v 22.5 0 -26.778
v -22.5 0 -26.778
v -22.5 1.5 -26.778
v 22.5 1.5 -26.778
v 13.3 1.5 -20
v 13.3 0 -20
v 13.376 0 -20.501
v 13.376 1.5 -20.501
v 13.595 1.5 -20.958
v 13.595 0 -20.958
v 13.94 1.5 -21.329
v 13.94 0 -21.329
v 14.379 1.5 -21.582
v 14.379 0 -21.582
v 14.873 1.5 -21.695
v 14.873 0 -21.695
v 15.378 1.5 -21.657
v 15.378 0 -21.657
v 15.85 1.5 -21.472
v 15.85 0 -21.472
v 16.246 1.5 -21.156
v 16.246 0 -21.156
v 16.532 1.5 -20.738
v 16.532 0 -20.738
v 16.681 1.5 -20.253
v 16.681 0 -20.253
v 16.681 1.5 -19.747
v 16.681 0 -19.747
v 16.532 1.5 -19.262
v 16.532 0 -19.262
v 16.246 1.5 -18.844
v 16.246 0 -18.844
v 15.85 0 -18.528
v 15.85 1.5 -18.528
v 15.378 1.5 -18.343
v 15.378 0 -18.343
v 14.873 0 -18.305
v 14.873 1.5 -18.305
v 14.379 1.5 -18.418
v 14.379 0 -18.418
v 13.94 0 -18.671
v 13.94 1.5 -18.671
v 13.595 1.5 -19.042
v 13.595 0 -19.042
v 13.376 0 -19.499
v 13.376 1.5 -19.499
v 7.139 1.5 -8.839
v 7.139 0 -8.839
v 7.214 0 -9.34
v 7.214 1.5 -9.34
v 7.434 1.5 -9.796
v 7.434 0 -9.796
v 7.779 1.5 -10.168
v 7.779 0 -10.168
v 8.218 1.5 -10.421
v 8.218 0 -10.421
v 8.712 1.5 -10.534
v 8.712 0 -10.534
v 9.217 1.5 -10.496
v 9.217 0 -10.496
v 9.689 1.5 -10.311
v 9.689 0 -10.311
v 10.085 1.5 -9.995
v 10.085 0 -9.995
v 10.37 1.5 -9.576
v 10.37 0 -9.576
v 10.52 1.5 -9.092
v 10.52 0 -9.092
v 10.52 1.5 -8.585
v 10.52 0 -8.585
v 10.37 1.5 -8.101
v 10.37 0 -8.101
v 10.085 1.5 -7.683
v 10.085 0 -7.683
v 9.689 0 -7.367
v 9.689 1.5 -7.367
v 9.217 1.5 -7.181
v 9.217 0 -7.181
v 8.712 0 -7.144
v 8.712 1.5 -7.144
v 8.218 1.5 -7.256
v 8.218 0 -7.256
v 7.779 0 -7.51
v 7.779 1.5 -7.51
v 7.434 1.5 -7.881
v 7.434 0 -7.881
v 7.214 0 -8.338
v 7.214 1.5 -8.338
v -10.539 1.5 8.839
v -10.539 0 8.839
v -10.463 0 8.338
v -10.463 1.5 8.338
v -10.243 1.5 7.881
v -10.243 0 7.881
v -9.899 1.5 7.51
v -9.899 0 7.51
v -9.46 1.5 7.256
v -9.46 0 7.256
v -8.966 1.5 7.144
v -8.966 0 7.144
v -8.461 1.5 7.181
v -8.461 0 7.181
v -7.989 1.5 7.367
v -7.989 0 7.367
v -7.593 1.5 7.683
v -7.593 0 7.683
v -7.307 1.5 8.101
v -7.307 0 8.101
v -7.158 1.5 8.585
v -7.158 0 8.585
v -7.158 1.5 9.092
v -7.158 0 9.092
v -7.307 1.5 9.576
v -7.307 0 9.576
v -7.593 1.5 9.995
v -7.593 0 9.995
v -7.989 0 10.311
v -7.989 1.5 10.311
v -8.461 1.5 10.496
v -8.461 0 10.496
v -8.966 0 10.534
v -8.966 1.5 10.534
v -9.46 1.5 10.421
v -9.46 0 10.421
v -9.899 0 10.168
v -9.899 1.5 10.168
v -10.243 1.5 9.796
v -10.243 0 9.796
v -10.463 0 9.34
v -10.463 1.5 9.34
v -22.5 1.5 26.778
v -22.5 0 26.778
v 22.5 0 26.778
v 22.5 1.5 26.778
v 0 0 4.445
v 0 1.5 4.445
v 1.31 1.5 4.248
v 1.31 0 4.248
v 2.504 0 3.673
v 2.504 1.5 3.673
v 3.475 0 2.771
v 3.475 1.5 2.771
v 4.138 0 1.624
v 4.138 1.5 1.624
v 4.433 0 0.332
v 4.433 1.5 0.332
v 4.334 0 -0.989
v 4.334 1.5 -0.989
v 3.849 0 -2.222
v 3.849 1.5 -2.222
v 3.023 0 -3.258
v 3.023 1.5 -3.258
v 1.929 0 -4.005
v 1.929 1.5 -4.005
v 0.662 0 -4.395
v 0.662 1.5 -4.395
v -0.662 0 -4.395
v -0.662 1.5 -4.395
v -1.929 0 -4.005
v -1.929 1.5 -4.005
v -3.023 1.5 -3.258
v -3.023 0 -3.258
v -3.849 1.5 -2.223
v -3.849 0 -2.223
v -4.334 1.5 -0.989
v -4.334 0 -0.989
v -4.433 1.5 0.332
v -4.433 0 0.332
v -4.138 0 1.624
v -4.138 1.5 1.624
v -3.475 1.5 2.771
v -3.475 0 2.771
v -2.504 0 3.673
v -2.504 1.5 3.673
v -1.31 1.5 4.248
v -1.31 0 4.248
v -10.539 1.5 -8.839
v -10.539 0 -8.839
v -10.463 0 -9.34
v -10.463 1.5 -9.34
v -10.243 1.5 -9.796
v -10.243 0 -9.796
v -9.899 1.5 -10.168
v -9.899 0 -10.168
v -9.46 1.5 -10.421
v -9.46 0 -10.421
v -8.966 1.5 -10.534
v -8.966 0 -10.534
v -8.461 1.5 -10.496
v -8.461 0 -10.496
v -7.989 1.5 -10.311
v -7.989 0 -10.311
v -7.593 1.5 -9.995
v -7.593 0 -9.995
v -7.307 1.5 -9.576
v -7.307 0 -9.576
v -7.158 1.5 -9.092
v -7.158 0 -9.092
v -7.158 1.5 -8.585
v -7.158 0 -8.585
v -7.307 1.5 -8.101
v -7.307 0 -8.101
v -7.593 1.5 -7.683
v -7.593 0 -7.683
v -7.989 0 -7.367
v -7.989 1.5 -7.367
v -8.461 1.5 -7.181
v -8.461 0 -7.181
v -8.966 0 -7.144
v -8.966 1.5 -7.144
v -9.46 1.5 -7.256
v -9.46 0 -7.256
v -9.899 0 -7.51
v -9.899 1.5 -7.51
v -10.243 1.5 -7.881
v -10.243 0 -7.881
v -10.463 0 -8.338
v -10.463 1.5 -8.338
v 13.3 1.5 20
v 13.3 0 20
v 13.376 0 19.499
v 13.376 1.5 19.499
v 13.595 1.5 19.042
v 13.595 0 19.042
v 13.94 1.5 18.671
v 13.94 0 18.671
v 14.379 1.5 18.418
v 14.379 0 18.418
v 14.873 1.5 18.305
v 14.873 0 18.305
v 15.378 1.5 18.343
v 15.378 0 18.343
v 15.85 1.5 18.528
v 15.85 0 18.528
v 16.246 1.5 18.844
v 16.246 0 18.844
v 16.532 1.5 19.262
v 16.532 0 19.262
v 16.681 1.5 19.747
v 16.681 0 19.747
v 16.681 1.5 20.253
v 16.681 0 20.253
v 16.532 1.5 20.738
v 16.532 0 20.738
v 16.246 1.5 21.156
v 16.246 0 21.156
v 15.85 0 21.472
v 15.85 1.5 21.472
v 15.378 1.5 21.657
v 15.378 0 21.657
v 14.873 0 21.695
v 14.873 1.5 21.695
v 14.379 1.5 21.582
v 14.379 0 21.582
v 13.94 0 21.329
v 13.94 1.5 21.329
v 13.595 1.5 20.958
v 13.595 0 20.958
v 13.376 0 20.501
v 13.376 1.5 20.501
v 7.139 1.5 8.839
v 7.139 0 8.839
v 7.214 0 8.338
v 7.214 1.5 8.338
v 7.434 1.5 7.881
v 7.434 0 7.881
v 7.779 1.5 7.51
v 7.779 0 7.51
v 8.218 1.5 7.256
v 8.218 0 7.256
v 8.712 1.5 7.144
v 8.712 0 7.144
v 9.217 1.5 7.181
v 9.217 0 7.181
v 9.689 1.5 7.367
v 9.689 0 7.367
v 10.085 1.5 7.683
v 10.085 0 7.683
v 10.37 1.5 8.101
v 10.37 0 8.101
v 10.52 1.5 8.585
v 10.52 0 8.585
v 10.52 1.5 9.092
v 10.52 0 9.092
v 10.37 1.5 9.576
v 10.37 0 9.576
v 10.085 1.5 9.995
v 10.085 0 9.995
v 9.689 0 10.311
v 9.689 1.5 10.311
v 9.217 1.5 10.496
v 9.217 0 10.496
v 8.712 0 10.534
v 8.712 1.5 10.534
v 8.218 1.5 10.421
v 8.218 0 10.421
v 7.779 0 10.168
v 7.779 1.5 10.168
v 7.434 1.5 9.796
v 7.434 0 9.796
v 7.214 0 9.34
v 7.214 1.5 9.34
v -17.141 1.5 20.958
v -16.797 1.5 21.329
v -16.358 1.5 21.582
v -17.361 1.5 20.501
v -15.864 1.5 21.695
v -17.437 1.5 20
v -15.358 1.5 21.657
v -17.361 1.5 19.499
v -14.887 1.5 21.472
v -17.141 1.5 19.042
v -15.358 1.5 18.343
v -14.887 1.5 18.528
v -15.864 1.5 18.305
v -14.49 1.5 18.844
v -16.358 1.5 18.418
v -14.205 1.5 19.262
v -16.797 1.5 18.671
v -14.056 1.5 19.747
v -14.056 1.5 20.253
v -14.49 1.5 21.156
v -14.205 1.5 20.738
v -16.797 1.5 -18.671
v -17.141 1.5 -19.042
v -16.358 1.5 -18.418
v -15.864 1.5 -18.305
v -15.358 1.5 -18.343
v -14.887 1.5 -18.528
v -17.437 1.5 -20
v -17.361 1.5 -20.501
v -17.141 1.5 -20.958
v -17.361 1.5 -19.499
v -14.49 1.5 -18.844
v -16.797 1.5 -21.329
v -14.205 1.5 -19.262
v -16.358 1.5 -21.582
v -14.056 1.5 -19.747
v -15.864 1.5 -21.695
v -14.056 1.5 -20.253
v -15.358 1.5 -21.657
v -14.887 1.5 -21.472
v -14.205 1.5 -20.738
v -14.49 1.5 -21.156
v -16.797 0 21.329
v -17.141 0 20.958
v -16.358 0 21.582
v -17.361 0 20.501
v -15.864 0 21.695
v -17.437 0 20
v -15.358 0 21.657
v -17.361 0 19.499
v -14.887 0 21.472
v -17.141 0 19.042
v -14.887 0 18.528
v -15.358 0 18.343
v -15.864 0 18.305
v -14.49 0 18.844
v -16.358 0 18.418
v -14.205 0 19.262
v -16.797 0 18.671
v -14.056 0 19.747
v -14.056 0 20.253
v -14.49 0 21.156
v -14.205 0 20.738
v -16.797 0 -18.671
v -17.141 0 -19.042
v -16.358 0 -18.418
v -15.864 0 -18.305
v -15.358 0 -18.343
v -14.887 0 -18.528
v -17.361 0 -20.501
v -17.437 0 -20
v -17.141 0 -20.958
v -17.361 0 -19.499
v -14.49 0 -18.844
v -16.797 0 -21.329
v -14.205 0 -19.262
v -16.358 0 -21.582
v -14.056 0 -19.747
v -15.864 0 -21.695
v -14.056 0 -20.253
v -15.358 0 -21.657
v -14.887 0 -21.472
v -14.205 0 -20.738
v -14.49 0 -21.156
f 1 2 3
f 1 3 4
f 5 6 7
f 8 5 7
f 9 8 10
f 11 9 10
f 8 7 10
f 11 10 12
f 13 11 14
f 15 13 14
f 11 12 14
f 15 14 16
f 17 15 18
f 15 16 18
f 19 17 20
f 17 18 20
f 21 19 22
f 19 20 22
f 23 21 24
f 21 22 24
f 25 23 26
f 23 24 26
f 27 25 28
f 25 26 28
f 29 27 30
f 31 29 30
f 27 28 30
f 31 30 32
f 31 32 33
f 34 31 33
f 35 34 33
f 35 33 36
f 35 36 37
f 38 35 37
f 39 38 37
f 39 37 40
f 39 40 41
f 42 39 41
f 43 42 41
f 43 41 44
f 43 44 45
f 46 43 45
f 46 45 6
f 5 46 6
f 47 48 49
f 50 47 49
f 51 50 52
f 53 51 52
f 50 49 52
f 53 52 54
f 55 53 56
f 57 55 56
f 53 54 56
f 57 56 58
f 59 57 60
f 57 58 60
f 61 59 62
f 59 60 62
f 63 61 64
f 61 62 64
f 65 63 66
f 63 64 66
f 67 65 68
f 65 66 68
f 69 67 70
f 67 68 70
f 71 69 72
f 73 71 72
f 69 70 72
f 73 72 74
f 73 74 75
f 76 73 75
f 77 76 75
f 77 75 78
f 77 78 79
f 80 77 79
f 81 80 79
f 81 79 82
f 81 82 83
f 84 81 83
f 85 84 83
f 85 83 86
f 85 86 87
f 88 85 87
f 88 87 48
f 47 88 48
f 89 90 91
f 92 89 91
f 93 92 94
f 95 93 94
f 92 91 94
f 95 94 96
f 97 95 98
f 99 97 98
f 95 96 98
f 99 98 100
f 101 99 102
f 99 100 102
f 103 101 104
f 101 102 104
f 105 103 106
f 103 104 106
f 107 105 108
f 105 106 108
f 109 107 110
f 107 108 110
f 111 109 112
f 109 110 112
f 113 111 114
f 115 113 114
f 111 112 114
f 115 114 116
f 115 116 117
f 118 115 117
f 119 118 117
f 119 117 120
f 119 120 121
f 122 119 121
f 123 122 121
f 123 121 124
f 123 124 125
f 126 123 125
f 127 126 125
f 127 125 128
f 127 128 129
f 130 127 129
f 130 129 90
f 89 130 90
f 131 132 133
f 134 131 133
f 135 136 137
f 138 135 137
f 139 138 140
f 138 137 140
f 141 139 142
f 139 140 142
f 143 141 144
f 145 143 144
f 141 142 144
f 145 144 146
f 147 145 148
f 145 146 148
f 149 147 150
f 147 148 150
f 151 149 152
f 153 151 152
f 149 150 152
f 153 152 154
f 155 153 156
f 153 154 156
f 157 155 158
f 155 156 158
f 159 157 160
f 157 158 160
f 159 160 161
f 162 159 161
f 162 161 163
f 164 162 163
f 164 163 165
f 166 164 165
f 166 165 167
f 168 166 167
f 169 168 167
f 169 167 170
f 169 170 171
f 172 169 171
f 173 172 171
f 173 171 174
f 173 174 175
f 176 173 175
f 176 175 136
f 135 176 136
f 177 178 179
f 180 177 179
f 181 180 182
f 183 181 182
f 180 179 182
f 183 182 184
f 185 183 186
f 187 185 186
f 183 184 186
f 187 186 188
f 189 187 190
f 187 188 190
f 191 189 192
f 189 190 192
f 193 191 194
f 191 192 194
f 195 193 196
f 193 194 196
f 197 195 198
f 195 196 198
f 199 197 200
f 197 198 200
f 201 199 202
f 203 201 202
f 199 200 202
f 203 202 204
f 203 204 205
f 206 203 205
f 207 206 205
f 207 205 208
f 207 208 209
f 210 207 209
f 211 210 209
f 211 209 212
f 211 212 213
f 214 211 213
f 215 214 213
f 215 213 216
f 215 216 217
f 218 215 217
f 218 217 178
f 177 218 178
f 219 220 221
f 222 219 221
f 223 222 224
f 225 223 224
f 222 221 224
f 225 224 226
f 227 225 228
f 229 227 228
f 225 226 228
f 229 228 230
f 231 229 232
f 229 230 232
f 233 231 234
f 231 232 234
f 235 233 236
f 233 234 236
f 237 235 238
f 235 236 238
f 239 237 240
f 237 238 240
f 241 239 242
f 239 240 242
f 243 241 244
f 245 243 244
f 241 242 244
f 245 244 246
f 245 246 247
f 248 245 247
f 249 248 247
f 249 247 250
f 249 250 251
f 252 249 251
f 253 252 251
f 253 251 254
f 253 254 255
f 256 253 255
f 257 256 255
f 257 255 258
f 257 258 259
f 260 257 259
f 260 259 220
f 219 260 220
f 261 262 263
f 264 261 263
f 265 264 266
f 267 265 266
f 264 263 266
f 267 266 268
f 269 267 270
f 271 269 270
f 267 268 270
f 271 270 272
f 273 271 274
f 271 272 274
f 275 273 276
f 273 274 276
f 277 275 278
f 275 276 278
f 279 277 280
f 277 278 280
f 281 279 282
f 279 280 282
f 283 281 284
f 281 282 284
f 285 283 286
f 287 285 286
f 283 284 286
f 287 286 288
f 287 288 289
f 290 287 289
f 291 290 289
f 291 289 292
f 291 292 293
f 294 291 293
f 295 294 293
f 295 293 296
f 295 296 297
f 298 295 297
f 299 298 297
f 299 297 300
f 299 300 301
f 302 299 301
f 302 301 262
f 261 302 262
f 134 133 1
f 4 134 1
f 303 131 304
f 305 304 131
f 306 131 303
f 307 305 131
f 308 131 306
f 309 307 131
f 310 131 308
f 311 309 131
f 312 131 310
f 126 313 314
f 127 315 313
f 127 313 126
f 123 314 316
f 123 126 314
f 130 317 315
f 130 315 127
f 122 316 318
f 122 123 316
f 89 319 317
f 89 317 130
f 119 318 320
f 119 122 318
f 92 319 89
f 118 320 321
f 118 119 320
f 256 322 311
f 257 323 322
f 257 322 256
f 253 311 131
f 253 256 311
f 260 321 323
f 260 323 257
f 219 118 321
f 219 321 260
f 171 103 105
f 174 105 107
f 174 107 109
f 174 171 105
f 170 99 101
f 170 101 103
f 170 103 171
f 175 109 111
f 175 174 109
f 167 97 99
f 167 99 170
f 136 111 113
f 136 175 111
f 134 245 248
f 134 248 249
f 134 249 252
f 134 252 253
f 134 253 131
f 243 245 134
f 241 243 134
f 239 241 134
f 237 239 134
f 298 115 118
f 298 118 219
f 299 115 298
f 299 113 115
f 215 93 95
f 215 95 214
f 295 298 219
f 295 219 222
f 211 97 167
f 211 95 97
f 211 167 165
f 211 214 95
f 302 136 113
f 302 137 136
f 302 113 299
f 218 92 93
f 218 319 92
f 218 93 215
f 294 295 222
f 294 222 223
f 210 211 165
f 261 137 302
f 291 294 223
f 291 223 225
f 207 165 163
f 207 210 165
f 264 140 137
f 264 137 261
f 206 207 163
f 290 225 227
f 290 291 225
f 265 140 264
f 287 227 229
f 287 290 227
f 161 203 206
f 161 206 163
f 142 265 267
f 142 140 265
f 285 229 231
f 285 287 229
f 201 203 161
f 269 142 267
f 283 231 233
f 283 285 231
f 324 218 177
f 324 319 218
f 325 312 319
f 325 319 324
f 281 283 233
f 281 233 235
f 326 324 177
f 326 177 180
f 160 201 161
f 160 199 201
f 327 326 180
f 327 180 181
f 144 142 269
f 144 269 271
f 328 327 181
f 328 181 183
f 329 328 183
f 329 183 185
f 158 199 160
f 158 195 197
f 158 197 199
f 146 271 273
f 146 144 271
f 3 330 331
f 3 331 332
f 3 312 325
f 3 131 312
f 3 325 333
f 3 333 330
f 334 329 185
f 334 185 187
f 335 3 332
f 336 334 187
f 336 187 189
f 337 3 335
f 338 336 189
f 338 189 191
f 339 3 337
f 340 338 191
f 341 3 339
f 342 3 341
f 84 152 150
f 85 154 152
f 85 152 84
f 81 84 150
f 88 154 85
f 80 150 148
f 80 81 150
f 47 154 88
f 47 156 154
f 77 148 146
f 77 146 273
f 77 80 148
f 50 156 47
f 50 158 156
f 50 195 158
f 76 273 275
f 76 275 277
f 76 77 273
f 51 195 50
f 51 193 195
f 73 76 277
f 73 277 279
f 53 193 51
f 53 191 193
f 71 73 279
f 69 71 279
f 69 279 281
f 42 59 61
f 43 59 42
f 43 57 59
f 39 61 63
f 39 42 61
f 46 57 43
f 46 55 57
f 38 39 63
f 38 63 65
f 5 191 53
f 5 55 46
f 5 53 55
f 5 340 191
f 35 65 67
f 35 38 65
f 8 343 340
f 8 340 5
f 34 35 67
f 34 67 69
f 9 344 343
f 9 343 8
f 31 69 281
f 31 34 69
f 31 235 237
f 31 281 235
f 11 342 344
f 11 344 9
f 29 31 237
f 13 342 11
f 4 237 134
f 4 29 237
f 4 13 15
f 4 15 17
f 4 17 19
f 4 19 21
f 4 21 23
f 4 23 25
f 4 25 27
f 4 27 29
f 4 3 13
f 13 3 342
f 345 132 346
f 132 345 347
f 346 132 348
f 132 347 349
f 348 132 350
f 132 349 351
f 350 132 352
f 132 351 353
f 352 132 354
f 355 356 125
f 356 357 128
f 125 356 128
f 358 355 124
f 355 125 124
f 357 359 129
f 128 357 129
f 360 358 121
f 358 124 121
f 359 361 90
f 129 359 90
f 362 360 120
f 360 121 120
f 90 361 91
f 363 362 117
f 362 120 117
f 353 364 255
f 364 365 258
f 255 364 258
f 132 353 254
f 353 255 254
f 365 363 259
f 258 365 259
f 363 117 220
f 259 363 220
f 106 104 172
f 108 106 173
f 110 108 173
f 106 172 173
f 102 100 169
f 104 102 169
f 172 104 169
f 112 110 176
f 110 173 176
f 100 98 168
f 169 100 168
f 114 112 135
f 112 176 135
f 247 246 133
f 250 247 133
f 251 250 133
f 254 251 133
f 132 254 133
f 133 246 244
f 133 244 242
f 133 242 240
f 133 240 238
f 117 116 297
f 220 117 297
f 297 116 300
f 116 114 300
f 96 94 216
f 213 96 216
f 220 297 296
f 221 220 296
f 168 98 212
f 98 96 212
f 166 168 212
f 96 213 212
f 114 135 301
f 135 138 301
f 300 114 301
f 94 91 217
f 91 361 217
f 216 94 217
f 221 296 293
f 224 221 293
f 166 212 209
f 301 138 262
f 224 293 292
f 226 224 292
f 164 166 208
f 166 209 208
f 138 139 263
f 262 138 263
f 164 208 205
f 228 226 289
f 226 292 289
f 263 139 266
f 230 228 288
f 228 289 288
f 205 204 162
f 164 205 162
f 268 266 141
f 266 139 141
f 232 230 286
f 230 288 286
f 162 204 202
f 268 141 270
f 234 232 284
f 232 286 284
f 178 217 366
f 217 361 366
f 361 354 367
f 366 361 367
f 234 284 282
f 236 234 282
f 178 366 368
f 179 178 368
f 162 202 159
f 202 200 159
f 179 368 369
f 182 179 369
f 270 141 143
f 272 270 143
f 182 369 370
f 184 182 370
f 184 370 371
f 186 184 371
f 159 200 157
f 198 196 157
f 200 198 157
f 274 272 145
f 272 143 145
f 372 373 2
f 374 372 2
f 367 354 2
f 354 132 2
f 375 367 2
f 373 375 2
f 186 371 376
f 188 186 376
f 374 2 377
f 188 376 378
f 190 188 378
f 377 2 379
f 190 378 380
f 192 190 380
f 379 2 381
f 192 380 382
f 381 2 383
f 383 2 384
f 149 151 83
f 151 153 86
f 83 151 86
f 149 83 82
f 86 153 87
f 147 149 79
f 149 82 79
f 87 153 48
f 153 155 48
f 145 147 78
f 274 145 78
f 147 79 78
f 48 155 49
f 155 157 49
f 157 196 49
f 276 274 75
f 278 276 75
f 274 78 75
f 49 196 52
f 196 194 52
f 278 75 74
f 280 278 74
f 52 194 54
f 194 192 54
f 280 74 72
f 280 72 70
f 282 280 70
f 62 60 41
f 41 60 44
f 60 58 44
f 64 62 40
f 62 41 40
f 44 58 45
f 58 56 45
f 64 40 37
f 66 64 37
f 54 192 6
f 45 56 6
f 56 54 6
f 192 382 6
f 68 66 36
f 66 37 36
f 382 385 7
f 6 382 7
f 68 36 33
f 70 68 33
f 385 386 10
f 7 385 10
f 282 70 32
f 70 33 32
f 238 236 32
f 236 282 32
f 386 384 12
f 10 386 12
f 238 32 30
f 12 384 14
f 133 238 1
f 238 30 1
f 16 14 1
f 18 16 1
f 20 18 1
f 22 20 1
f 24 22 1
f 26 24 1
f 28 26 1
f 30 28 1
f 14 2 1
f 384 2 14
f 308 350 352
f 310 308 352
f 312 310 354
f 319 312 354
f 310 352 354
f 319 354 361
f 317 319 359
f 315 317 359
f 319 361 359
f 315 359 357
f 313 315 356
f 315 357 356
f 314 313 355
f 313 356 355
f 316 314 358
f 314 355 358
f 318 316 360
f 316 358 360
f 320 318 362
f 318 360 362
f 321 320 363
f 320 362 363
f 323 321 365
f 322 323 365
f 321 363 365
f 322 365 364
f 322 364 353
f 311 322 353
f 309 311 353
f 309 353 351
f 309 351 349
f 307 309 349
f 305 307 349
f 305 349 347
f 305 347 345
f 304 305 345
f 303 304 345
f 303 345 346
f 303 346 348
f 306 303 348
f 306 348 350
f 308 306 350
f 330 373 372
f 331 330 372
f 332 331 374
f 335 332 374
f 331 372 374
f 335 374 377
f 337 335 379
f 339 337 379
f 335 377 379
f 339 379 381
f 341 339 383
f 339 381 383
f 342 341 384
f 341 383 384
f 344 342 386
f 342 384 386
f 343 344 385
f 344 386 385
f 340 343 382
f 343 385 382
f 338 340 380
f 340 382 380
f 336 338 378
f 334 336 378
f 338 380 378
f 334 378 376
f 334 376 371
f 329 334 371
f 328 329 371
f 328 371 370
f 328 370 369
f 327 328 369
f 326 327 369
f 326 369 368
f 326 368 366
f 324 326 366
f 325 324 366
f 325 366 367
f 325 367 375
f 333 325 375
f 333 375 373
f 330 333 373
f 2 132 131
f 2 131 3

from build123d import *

# Parameters (mm, degrees)
SKETCH2_W            = 45
SKETCH2_H            = 53.556000076
BOSS_EXTRUDE1_DEPTH  = 1.5
M3_CLEARANCE_HOLE_D  = 3.4
M3_CLEARANCE_HOLE1_D = 3.4
CUT_EXTRUDE1_REACH   = 37.008
SKETCH17_R           = 4.445


with BuildPart() as part:
    # Sketch2 → Boss-Extrude1 (new body)
    with BuildSketch(Plane(origin=(0, 0, 0), x_dir=(1, 0, 0), z_dir=(0, 1, 0))):
        Rectangle(SKETCH2_W, SKETCH2_H)
    extrude(amount=BOSS_EXTRUDE1_DEPTH)

    # M3 Clearance Hole (through all)
    with Locations(Plane(origin=(0, 1.5, 0), x_dir=(1, 0, 0), z_dir=(0, 1, 0))):
        with Locations((-15.736599944, 20), (15, 20), (15, -20), (-15.736599944, -20), (0, 0)):
            Hole(M3_CLEARANCE_HOLE_D / 2)

    # M3 Clearance Hole1 (through all)
    with Locations(Plane(origin=(0, 1.5, 0), x_dir=(1, 0, 0), z_dir=(0, 1, 0))):
        with Locations((-8.838834765, -8.838834765), (-8.838834765, 8.838834765), (8.838834765, -8.838834765), (8.838834765, 8.838834765)):
            Hole(M3_CLEARANCE_HOLE1_D / 2)

    # Sketch17 → Cut-Extrude1 (cut, up to next)
    with BuildSketch(Plane(origin=(0, 1.5, 0), x_dir=(1, 0, 0), z_dir=(0, 1, 0)), mode=Mode.PRIVATE) as cut_extrude1_sk1:
        with Locations(Location((0, 0, 0), (0, 0, 270))):
            Circle(SKETCH17_R)
    cut_extrude1_tool1 = extrude(cut_extrude1_sk1.sketch, amount=-CUT_EXTRUDE1_REACH, mode=Mode.PRIVATE) & part.part
    add(cut_extrude1_tool1.solids().sort_by_distance((0, 1.5, 0))[0], mode=Mode.SUBTRACT)


solid = part.part
